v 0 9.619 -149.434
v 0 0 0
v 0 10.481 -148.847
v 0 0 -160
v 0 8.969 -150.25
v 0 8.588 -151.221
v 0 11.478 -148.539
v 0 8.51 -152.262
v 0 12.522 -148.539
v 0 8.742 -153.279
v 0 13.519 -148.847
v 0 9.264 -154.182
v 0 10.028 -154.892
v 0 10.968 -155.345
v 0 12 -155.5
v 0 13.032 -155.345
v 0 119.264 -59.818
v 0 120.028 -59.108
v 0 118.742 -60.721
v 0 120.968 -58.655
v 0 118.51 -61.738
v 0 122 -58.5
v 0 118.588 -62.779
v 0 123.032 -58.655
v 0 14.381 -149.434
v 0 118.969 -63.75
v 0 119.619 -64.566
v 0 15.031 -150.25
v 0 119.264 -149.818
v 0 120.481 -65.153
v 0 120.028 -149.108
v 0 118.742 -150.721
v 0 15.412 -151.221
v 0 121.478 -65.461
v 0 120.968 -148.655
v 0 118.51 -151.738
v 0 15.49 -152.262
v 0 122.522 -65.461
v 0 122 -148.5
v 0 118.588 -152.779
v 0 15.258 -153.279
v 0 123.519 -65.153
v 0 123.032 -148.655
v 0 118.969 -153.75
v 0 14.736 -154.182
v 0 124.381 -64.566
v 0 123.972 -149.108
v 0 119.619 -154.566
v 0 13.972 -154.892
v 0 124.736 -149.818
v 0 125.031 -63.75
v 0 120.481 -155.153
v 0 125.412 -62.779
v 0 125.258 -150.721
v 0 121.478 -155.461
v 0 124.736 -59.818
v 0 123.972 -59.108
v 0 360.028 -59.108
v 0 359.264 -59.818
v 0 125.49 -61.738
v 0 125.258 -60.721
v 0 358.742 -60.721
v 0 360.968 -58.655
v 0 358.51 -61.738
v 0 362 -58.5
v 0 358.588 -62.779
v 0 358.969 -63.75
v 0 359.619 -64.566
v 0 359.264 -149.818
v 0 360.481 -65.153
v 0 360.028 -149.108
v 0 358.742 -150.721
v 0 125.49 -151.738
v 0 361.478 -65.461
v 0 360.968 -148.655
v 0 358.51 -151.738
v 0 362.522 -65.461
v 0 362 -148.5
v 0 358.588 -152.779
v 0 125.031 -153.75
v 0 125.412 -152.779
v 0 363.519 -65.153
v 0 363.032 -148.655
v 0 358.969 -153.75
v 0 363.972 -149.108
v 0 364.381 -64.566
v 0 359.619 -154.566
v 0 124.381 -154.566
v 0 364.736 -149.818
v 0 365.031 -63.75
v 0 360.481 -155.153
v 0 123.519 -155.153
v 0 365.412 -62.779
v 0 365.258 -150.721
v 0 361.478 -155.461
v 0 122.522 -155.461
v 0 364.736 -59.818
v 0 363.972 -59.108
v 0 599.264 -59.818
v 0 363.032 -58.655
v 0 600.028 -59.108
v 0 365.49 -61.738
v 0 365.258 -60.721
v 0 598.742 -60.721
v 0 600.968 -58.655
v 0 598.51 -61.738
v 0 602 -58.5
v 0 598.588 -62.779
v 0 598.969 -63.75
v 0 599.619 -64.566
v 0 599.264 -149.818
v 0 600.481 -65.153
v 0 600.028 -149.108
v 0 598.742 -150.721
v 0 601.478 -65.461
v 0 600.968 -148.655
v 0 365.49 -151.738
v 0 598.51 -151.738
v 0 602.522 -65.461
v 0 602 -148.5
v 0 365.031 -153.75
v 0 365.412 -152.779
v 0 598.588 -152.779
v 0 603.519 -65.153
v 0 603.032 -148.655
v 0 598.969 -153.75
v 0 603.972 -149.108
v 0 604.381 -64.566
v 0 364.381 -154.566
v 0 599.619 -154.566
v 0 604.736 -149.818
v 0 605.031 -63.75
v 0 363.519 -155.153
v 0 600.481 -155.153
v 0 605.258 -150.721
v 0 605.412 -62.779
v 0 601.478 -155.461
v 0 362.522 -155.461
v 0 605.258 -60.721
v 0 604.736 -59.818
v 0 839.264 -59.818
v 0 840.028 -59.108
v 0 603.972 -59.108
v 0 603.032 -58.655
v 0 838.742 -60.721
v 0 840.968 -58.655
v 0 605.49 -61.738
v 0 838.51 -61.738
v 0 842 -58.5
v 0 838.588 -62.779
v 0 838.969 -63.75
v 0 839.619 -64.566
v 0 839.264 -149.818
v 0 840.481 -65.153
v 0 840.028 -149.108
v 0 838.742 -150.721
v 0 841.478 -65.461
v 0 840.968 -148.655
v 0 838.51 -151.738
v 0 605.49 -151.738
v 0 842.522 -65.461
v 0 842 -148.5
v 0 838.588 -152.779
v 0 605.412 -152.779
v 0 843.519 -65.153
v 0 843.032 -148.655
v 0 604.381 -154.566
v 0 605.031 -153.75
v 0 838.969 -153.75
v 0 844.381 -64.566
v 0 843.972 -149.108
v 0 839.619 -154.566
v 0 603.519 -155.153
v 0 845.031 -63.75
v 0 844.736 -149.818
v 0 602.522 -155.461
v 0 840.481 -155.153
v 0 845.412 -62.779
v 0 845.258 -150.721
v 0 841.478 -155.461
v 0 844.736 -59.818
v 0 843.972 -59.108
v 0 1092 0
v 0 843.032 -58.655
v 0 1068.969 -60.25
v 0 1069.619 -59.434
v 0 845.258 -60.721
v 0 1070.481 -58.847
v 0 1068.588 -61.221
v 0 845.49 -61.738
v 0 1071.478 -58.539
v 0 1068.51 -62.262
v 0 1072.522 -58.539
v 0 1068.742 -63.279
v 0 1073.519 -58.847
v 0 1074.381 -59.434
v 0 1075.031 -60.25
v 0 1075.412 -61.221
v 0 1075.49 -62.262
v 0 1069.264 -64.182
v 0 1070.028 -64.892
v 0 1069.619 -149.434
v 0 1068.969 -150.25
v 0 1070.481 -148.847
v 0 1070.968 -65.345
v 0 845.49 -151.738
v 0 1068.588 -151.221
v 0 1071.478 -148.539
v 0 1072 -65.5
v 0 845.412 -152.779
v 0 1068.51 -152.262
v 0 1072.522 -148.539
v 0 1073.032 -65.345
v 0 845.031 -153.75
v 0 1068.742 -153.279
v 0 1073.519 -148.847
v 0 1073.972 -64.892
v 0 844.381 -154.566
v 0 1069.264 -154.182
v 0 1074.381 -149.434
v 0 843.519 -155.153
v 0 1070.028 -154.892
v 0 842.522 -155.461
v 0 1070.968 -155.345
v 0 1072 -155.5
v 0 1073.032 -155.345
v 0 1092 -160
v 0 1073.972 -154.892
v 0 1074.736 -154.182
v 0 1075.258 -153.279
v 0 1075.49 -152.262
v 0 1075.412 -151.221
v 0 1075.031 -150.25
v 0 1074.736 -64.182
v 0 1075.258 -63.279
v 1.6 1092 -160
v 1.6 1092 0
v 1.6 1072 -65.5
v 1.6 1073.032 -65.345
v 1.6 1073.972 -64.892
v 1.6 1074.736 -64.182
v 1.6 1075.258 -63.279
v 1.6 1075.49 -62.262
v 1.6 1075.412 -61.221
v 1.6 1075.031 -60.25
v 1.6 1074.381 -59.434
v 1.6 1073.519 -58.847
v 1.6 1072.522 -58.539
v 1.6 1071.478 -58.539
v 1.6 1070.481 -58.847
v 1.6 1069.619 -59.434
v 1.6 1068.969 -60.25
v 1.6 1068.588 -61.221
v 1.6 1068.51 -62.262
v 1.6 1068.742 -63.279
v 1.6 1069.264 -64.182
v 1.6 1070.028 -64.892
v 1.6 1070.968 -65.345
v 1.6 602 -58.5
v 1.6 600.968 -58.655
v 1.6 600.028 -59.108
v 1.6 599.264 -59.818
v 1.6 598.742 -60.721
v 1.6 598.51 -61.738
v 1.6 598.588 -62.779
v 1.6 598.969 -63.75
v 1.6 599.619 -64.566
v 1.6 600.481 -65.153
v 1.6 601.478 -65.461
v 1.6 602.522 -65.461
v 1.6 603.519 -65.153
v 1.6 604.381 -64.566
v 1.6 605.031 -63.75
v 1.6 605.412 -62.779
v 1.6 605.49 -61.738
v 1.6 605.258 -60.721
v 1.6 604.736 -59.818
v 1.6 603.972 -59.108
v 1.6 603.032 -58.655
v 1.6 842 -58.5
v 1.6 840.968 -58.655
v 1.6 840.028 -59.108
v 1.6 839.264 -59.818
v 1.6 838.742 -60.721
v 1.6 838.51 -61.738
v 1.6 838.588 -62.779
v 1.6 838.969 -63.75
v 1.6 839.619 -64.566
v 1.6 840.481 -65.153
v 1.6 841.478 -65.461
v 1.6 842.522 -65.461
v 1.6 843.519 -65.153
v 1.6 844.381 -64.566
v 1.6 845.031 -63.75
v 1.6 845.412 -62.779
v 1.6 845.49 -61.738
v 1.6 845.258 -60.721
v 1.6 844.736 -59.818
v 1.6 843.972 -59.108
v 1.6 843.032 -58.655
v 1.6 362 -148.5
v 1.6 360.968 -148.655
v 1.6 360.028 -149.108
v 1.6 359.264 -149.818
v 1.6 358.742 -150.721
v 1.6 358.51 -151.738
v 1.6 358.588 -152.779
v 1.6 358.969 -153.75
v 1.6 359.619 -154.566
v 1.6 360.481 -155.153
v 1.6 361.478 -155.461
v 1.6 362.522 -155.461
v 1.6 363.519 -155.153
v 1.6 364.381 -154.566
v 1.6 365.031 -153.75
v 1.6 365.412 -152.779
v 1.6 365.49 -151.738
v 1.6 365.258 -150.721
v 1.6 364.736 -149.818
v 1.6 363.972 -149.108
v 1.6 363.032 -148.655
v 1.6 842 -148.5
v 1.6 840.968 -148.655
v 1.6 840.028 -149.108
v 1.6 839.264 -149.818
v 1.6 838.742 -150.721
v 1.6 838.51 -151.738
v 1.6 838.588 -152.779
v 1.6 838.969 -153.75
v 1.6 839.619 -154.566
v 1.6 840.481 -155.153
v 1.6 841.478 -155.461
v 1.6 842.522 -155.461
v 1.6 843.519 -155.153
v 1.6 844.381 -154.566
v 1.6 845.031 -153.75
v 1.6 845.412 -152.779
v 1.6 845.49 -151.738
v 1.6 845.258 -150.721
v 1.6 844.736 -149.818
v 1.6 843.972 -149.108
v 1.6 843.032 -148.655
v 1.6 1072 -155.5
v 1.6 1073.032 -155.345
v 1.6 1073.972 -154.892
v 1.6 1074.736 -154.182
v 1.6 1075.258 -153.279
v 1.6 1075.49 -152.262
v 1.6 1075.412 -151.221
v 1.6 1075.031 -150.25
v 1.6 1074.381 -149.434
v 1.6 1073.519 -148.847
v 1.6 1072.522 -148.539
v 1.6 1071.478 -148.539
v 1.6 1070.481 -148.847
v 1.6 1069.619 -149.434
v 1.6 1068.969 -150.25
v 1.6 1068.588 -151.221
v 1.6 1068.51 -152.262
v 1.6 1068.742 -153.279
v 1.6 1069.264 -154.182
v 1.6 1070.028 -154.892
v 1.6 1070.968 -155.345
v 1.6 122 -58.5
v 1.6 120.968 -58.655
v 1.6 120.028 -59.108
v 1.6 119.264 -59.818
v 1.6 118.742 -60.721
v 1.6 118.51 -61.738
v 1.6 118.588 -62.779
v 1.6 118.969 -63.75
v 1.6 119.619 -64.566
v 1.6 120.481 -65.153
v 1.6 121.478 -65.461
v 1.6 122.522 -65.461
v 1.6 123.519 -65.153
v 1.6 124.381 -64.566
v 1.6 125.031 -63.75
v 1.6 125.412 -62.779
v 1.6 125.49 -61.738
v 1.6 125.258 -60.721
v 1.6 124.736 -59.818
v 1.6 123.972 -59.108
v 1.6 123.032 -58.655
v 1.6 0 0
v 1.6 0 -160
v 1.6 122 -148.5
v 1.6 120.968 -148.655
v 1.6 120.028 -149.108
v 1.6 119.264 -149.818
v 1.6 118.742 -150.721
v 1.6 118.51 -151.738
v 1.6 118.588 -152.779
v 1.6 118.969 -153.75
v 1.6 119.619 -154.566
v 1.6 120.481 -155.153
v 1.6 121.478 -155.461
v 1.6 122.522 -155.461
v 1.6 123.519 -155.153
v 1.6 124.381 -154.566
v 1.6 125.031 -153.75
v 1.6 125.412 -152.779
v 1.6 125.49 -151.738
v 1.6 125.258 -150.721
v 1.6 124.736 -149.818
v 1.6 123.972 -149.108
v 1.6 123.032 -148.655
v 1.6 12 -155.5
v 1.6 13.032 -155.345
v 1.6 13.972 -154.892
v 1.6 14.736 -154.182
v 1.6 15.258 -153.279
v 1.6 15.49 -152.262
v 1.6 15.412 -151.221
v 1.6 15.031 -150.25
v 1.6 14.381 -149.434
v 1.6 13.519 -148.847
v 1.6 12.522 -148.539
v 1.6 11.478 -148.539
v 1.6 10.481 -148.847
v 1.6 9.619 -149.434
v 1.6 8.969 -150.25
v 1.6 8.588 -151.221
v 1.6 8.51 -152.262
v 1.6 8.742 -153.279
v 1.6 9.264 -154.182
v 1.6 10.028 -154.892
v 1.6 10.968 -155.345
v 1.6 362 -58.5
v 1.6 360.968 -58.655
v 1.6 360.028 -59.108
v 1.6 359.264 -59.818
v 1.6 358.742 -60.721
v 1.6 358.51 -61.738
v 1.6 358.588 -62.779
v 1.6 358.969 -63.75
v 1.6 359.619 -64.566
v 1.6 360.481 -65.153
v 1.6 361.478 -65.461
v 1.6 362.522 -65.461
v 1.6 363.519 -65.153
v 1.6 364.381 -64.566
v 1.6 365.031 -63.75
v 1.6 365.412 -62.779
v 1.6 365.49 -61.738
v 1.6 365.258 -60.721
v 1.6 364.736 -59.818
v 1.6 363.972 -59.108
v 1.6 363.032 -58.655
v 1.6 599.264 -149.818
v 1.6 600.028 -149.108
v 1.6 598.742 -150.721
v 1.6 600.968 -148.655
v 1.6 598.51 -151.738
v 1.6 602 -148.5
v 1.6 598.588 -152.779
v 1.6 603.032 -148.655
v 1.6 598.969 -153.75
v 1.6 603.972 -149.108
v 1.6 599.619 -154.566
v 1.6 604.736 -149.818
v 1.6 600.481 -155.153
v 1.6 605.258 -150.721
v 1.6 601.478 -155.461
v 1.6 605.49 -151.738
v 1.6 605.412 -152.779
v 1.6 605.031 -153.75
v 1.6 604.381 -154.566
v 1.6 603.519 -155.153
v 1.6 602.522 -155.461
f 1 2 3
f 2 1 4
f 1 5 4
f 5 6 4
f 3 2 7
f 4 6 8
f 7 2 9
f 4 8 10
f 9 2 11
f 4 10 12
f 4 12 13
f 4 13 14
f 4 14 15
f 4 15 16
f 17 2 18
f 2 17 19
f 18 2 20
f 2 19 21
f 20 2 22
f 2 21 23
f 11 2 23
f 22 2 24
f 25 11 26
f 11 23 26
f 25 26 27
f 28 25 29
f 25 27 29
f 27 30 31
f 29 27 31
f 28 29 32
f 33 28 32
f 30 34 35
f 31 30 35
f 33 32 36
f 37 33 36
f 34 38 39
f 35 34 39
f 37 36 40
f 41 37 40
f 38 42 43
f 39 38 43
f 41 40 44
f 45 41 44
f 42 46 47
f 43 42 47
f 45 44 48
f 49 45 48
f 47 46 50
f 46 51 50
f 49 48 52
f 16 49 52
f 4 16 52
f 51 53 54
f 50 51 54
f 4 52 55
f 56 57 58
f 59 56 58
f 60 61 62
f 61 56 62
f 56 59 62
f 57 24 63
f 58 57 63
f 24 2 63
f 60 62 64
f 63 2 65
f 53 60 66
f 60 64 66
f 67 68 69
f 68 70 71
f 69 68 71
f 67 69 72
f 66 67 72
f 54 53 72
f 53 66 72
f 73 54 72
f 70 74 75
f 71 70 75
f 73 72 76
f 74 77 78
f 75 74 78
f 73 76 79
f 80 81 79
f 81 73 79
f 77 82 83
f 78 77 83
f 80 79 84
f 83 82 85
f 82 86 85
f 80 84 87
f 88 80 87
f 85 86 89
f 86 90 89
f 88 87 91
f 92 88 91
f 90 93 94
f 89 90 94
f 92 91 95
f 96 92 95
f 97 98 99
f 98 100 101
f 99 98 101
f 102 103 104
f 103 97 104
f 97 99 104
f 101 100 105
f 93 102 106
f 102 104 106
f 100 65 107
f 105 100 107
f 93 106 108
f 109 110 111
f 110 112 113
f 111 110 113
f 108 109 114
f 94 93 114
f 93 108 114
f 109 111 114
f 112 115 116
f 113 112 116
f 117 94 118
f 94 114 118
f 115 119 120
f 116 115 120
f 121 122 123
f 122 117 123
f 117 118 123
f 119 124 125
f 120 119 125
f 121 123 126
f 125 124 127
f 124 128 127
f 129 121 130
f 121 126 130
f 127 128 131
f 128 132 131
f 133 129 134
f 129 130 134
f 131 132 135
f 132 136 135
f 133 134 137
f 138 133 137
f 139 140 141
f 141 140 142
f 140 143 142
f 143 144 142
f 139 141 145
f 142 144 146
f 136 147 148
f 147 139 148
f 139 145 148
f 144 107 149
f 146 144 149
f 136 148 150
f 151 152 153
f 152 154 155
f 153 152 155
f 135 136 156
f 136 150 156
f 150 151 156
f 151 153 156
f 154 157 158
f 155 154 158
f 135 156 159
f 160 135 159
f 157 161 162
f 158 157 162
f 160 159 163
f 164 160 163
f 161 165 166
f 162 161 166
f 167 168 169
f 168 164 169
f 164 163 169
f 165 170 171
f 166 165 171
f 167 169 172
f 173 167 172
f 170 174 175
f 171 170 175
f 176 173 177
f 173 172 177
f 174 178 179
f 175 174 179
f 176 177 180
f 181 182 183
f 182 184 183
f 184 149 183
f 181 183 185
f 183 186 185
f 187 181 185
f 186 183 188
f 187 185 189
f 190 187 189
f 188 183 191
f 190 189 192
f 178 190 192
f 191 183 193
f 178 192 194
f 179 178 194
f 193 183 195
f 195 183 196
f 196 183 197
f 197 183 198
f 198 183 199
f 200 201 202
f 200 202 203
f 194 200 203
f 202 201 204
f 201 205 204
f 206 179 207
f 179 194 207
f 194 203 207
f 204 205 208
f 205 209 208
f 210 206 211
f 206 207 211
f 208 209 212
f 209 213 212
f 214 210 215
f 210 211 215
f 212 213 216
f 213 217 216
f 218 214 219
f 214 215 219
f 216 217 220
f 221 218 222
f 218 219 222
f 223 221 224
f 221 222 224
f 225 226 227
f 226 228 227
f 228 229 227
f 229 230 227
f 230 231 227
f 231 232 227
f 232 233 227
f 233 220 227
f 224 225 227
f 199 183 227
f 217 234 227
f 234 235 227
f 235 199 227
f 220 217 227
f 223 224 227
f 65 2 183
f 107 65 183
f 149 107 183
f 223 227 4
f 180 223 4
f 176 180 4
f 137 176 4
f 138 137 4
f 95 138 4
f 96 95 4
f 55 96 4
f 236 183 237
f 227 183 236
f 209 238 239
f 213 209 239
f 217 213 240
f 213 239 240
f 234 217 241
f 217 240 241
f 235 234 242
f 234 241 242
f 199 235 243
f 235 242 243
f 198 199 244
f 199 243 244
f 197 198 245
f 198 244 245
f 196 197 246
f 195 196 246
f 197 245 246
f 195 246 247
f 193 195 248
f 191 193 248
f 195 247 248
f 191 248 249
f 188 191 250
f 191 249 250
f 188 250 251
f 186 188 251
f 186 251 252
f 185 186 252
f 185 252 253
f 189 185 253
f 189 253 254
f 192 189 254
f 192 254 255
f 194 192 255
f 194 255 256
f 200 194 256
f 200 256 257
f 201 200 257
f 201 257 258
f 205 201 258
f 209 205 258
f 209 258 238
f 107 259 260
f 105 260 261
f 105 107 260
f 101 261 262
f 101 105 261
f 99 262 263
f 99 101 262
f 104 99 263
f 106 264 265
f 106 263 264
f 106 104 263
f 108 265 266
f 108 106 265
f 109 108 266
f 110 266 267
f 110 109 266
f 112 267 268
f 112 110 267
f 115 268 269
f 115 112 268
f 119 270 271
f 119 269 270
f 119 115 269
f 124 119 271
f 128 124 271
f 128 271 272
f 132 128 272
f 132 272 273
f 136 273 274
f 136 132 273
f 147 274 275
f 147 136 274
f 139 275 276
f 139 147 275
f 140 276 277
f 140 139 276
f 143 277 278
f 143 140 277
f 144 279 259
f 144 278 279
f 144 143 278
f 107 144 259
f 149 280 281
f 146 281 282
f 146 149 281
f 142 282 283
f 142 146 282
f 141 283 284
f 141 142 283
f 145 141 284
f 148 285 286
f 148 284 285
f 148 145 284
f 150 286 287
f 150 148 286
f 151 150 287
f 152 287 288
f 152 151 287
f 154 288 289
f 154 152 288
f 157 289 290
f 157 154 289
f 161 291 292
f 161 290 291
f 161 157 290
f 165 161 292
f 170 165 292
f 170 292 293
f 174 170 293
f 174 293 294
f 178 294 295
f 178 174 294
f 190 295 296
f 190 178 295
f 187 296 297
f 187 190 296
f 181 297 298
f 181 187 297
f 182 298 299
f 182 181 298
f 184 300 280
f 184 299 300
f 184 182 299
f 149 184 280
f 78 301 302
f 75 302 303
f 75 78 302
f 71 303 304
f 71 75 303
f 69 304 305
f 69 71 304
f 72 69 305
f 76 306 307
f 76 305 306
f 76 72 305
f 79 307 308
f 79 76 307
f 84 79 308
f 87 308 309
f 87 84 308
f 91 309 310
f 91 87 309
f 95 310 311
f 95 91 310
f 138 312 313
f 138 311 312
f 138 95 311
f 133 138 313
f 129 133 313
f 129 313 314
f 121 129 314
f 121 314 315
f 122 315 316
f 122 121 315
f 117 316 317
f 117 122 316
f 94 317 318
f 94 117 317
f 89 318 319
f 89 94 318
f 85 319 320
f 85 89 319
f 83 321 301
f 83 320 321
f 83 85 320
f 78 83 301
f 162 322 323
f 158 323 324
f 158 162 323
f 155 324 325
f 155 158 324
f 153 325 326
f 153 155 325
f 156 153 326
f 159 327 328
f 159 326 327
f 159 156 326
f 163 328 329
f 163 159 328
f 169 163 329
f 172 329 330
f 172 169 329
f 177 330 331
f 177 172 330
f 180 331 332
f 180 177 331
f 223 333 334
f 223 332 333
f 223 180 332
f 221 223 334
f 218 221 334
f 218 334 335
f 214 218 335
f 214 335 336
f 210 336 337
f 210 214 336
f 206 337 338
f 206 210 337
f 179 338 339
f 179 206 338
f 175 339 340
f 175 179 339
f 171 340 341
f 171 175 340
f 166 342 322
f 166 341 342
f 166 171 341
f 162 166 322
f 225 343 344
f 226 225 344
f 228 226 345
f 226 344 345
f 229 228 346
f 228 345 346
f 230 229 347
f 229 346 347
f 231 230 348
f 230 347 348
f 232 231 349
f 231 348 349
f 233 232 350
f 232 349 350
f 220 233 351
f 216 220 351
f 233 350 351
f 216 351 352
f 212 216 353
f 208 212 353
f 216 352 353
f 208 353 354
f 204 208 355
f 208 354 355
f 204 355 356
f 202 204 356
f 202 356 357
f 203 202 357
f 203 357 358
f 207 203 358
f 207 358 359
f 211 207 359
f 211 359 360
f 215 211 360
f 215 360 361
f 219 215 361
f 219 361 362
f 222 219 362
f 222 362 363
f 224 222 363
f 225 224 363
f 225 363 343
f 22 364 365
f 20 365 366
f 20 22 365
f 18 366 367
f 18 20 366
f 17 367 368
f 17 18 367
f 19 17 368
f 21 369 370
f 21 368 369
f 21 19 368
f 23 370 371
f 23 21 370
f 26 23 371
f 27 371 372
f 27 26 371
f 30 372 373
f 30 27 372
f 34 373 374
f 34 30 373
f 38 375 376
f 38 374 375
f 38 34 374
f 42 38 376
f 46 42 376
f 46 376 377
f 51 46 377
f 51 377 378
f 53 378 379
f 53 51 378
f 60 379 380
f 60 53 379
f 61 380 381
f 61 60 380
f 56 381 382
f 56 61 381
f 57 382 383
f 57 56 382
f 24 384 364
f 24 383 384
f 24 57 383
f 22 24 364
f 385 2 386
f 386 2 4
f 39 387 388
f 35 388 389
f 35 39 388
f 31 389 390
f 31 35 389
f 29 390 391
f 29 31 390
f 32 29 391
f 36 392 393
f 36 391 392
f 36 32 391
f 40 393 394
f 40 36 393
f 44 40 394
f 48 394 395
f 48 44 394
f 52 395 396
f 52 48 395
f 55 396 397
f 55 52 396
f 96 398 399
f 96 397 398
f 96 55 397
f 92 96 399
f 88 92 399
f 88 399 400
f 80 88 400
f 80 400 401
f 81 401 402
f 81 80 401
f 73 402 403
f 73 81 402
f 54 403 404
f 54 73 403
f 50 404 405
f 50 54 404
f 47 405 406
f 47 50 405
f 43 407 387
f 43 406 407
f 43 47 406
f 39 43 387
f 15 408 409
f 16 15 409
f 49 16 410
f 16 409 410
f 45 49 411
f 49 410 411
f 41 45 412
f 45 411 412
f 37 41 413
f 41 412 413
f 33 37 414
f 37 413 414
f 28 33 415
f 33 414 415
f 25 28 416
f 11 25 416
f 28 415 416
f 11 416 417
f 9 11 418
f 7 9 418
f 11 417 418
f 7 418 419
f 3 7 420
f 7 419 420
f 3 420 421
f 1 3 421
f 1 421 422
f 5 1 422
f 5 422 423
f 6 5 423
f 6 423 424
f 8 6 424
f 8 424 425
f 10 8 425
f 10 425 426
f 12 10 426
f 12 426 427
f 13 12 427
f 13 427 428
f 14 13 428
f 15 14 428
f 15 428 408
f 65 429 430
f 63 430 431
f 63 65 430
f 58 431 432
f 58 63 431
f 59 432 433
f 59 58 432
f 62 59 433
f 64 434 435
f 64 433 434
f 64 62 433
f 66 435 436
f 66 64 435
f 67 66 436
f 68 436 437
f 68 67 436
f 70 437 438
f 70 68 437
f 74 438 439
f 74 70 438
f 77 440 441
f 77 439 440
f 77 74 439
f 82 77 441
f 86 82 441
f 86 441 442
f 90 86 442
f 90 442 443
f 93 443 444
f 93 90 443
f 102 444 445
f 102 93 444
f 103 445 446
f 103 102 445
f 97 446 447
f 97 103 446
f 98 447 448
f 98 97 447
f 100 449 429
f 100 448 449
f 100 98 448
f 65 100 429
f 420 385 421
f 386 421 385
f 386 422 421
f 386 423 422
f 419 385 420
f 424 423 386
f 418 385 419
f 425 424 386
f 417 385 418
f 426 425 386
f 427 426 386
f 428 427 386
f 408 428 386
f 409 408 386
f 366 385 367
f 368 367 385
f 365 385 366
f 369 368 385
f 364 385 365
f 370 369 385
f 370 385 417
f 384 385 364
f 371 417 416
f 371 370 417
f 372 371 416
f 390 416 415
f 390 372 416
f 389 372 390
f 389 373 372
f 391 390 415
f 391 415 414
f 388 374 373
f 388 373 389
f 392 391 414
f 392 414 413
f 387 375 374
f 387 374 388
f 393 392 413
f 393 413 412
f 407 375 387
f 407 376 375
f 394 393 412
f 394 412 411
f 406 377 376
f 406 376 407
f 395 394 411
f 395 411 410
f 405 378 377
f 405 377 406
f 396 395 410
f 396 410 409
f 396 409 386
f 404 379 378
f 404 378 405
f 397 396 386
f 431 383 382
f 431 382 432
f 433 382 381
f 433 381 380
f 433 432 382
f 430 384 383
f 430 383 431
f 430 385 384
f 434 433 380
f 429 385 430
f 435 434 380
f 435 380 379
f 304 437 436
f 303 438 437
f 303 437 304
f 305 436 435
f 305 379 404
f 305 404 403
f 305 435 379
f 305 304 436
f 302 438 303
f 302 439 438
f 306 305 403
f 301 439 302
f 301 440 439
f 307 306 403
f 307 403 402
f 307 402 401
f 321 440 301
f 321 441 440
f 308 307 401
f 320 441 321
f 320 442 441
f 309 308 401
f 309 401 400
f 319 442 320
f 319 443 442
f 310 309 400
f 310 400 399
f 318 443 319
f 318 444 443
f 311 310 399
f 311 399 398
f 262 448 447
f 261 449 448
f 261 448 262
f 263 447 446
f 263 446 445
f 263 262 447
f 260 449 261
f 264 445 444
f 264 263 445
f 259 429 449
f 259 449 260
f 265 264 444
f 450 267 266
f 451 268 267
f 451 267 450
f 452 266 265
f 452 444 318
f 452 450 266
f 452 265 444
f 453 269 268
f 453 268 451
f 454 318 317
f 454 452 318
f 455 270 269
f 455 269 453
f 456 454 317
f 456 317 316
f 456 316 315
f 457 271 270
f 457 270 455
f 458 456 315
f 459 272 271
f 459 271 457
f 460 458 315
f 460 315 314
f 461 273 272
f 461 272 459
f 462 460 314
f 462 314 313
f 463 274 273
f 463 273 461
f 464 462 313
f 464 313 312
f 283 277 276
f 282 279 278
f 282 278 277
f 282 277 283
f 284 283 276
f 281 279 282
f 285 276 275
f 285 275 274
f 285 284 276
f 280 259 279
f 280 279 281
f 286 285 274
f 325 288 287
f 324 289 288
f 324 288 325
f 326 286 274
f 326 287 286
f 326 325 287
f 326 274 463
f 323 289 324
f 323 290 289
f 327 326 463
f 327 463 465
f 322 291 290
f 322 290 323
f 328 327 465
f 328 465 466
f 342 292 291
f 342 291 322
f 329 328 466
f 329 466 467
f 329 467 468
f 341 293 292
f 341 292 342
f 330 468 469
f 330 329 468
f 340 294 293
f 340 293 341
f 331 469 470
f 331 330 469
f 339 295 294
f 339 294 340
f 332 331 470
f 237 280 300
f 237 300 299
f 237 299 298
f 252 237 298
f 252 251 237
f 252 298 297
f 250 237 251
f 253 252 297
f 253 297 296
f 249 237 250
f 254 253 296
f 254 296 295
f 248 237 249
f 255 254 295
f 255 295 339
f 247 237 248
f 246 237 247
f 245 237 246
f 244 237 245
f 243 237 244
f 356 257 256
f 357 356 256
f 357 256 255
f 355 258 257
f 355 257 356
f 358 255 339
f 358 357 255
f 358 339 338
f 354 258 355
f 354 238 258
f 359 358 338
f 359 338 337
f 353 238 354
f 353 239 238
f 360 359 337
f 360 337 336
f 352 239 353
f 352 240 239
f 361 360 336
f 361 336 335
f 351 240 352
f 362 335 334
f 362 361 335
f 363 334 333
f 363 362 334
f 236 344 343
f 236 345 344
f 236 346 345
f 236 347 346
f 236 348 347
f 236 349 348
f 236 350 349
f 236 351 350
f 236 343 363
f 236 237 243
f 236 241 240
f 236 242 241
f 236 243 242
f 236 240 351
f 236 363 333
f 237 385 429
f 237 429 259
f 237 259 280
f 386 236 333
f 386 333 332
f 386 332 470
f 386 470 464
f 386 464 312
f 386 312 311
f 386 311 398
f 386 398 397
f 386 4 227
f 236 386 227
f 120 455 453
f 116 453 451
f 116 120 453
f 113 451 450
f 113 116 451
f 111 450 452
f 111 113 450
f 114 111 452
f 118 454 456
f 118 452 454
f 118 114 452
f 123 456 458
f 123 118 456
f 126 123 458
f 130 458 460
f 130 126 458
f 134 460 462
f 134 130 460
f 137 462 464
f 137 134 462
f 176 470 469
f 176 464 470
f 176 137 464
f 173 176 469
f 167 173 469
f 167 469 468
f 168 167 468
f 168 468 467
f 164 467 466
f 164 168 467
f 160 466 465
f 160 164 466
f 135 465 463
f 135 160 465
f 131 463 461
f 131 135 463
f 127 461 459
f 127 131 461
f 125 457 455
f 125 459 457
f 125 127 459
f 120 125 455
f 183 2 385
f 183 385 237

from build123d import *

# Parameters (mm, degrees)
SKETCH1_W                         = 160
SKETCH1_H                         = 1092
BOSS_EXTRUDE1_DEPTH               = 1.6
F_7_0_7_DIAMETER_HOLE1_D          = 7
F_7_0_7_DIAMETER_HOLE1_DEPTH      = 12
F_7_0_7_DIAMETER_HOLE1_TIP        = 2.103012167
F_7_0_7_DIAMETER_HOLE3_AT_2_COUNT = 2
F_7_0_7_DIAMETER_HOLE3_AT_2_PITCH = 90
LPATTERN1_COUNT                   = 4
LPATTERN1_PITCH                   = 240


with BuildPart() as part:
    # Sketch1 → Boss-Extrude1 (new body)
    with BuildSketch(Plane(origin=(0, 0, 0), x_dir=(0, 0, -1), z_dir=(1, 0, 0))):
        with Locations((80, 546)):
            Rectangle(SKETCH1_W, SKETCH1_H)
    extrude(amount=BOSS_EXTRUDE1_DEPTH)

    # Ø7.0 (7) Diameter Hole1
    with Locations(Plane.ZY):
        with Locations((-152, 12), (-152, 1072), (-62, 1072)):
            Hole(F_7_0_7_DIAMETER_HOLE1_D / 2, depth=F_7_0_7_DIAMETER_HOLE1_DEPTH)
            with Locations((0, 0, -(F_7_0_7_DIAMETER_HOLE1_DEPTH + F_7_0_7_DIAMETER_HOLE1_TIP / 2))):  # 118° drill point
                Cone(0, F_7_0_7_DIAMETER_HOLE1_D / 2, F_7_0_7_DIAMETER_HOLE1_TIP, mode=Mode.SUBTRACT)

    # Sketch4 → Ø7.0 (7) Diameter Hole3 (revolve, cut)
    with BuildSketch(Plane(origin=(0, 122, -152), x_dir=(0, 0, 1), z_dir=(0, 1, 0))):
        Polygon((0, 0), (0, 14.103012167), (3.5, 12), (3.5, 0), align=None)
    f_7_0_7_diameter_hole3 = revolve(axis=Axis((-6.35, 122, -152), (1, 0, 0)), mode=Mode.SUBTRACT)

    # Ø7.0 (7) Diameter Hole3 at 2: Ø7.0 (7) Diameter Hole3 ×2
    with Locations(*[(0, 0, i * F_7_0_7_DIAMETER_HOLE3_AT_2_PITCH) for i in range(1, F_7_0_7_DIAMETER_HOLE3_AT_2_COUNT)]):
        add(f_7_0_7_diameter_hole3, mode=Mode.SUBTRACT)

    # LPattern1: Ø7.0 (7) Diameter Hole3 ×4
    with Locations(*[(0, i * LPATTERN1_PITCH, 0) for i in range(1, LPATTERN1_COUNT)]):
        add(f_7_0_7_diameter_hole3, mode=Mode.SUBTRACT)

    # LPattern1 copy 1 sketch → LPattern1 copy 1 (revolve, cut)
    with BuildSketch(Plane(origin=(0, 362, -62), x_dir=(0, 0, 1), z_dir=(0, 1, 0))):
        Polygon((0, 0), (0, 14.103012167), (3.5, 12), (3.5, 0), align=None)
    revolve(axis=Axis((-6.35, 362, -62), (1, 0, 0)), mode=Mode.SUBTRACT)

    # LPattern1 copy 2 sketch → LPattern1 copy 2 (revolve, cut)
    with BuildSketch(Plane(origin=(0, 602, -62), x_dir=(0, 0, 1), z_dir=(0, 1, 0))):
        Polygon((0, 0), (0, 14.103012167), (3.5, 12), (3.5, 0), align=None)
    revolve(axis=Axis((-6.35, 602, -62), (1, 0, 0)), mode=Mode.SUBTRACT)

    # LPattern1 copy 3 sketch → LPattern1 copy 3 (revolve, cut)
    with BuildSketch(Plane(origin=(0, 842, -62), x_dir=(0, 0, 1), z_dir=(0, 1, 0))):
        Polygon((0, 0), (0, 14.103012167), (3.5, 12), (3.5, 0), align=None)
    revolve(axis=Axis((-6.35, 842, -62), (1, 0, 0)), mode=Mode.SUBTRACT)


solid = part.part
